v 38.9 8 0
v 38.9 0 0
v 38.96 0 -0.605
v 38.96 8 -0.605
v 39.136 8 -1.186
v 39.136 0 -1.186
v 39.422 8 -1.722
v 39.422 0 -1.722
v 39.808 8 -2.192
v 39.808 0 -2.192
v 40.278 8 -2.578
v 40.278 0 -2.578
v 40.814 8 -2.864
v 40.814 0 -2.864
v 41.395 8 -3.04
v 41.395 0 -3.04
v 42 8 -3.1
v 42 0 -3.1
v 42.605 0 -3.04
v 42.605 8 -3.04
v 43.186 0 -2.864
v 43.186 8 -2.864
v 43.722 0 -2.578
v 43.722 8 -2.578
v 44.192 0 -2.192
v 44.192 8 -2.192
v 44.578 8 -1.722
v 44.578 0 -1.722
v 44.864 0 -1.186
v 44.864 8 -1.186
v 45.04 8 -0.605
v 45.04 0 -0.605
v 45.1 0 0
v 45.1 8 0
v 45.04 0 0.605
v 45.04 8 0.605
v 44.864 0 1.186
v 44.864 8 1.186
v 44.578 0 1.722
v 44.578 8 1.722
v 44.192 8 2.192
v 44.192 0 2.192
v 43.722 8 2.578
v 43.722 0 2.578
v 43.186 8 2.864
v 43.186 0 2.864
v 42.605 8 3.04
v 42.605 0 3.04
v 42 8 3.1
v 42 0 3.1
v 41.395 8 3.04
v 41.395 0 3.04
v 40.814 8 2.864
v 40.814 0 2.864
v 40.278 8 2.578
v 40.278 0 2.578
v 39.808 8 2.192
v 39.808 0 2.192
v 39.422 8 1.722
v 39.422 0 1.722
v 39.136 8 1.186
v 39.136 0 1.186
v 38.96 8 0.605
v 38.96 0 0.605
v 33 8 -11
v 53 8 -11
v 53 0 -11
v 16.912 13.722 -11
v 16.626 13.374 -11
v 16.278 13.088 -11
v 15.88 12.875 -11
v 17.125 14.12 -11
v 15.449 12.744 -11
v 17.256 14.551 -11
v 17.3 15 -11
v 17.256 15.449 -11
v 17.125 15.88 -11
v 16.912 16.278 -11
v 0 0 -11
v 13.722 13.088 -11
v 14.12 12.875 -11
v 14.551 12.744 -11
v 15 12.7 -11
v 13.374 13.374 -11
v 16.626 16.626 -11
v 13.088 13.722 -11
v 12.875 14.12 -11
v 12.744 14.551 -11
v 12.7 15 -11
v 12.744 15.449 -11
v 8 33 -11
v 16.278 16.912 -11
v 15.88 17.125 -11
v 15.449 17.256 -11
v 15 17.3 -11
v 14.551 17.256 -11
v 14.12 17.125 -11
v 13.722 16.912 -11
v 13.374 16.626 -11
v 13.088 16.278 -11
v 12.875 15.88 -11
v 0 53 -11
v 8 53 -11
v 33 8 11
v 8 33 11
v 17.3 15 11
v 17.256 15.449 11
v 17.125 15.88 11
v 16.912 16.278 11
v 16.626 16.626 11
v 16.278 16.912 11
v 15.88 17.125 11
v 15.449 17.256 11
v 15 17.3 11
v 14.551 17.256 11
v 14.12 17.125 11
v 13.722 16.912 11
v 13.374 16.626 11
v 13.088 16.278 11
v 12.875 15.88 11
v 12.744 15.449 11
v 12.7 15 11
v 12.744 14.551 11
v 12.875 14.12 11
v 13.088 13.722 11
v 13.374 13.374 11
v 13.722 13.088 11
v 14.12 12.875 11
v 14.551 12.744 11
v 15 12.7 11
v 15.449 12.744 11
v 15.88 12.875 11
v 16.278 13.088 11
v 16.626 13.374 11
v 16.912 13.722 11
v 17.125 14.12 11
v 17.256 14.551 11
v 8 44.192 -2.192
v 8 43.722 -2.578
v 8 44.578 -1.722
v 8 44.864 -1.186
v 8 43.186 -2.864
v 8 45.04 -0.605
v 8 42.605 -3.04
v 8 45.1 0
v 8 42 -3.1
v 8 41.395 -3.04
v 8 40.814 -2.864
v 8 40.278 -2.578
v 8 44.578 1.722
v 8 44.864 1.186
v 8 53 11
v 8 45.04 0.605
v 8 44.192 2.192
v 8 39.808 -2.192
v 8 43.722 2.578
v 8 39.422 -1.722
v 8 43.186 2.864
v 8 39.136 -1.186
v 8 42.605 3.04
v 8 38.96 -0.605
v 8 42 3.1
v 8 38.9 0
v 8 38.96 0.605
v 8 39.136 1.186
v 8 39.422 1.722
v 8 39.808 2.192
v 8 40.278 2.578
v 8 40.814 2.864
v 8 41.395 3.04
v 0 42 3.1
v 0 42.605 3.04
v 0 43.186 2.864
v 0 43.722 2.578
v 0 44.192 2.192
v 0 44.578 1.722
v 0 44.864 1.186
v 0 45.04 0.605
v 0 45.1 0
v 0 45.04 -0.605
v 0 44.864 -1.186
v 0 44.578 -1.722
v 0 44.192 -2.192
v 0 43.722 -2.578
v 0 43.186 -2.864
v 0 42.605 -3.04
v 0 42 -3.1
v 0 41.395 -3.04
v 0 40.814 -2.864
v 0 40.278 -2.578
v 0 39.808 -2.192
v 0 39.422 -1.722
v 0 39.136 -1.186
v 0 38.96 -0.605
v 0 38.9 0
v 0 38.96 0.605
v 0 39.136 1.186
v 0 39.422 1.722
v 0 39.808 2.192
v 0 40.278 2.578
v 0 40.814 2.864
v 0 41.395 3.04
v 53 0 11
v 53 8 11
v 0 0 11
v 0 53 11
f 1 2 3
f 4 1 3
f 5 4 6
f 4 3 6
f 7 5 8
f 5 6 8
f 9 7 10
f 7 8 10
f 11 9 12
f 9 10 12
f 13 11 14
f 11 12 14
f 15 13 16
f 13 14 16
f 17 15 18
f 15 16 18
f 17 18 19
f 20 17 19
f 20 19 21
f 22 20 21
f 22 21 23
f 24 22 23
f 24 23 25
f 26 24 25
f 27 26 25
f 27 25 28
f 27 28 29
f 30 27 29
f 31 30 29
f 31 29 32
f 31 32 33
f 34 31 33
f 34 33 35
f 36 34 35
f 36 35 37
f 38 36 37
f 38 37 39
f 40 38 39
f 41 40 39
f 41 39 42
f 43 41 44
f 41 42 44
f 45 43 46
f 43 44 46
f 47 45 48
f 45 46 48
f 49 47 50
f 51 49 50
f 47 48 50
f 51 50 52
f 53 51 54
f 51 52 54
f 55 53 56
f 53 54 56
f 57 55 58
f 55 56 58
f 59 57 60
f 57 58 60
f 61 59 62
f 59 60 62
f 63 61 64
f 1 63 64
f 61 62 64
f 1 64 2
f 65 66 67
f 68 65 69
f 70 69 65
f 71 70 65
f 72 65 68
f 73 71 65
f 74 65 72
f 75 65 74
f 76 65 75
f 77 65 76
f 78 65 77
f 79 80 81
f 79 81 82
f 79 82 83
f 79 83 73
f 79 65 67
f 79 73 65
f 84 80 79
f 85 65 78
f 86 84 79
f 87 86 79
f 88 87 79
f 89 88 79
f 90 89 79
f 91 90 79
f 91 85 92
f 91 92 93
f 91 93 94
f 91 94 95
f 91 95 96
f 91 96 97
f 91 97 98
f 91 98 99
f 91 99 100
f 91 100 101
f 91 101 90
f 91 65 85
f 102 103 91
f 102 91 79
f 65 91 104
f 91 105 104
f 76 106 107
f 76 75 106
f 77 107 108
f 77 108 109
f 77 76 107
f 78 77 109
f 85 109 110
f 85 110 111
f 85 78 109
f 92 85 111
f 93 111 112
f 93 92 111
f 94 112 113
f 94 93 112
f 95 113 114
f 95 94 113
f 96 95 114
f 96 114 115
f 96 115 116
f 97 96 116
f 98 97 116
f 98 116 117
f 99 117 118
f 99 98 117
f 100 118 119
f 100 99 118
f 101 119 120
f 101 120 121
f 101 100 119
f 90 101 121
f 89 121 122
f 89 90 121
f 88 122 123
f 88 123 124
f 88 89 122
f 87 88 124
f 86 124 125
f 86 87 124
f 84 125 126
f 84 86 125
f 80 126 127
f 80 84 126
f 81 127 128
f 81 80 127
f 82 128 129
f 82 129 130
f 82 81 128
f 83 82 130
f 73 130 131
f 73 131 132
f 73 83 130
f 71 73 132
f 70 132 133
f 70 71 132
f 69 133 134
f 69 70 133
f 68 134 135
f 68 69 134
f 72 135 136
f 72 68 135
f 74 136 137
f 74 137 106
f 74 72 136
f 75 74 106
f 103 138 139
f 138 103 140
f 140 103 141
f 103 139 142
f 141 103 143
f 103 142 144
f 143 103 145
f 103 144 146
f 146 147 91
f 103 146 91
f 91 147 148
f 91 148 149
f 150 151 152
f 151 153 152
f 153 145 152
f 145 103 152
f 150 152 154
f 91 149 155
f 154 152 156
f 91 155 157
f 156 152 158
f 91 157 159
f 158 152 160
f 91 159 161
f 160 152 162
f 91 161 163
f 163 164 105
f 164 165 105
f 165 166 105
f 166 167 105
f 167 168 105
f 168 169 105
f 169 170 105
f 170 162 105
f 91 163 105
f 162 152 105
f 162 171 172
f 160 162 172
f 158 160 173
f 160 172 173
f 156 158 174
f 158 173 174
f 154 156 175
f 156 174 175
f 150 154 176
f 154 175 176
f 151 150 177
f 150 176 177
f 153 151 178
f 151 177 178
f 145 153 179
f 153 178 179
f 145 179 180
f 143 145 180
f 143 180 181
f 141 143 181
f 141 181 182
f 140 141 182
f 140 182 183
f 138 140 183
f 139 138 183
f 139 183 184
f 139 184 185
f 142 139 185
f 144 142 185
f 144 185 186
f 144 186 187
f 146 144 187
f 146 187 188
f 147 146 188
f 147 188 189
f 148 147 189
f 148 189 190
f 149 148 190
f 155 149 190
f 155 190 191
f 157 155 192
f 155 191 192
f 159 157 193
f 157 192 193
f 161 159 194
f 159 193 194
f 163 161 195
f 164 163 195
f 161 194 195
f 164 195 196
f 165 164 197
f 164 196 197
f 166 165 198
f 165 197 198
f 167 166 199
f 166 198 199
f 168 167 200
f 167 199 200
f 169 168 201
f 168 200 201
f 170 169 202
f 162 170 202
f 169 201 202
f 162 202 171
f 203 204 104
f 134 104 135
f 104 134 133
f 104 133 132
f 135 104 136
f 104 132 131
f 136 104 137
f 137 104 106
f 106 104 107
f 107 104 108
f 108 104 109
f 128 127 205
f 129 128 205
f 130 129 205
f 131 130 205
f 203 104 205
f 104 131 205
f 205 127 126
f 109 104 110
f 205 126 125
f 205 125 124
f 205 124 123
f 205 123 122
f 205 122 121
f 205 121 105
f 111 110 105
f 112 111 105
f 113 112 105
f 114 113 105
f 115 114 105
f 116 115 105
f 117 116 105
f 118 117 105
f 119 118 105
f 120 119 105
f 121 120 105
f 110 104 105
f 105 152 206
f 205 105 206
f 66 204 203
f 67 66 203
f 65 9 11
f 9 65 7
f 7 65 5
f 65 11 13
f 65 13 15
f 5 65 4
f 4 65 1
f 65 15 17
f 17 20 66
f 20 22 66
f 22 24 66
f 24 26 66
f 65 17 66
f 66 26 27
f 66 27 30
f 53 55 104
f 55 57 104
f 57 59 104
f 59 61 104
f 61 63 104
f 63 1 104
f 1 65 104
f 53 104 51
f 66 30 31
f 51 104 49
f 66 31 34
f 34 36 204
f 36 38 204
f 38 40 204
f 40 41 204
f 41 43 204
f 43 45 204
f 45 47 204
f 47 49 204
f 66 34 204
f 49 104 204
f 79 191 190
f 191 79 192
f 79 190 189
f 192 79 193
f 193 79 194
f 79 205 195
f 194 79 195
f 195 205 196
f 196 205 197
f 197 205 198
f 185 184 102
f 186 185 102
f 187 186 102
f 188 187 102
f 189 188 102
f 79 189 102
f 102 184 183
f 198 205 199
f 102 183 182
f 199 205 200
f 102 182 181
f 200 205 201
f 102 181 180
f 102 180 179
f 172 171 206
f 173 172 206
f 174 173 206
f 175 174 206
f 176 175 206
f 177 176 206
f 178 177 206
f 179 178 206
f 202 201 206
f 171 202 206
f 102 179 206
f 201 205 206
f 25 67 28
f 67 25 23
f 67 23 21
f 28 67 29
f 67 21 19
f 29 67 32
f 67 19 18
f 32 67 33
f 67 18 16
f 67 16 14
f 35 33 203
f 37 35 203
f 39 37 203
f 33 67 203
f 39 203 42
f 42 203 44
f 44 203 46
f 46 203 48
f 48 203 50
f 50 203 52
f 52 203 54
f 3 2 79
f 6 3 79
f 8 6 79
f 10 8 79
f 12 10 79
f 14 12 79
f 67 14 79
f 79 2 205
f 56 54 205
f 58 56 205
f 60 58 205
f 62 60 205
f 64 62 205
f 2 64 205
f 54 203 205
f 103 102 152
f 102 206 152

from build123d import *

# Parameters (mm, degrees)
SKETCH_1_R              = 2.3
EXTRUDE_1_DEPTH         = 11
HOLE_WIZARD_6_2_6_2_1_D = 6.2
HOLE_WIZARD_6_2_6_2_2_D = 6.2


with BuildPart() as part:
    # 草图1 → 凸台-拉伸1 (new, symmetric)
    with BuildSketch(Plane.XY):
        Polygon((0, 0), (0, 53), (8, 53), (8, 33), (33, 8), (53, 8), (53, 0), align=None)
        with Locations((15, 15)):
            Circle(SKETCH_1_R, mode=Mode.SUBTRACT)
    extrude(amount=EXTRUDE_1_DEPTH, both=True)

    # Ø6.2 (6.2) 直径孔1 (through all)
    with Locations(Plane(origin=(0, 8, 0), x_dir=(1, 0, 0), z_dir=(0, 1, 0))):
        with Locations((42, 0)):
            Hole(HOLE_WIZARD_6_2_6_2_1_D / 2)

    # Ø6.2 (6.2) 直径孔2 (through all)
    with Locations(Plane(origin=(8, 0, 0), x_dir=(0, 0, -1), z_dir=(1, 0, 0))):
        with Locations((0, 42)):
            Hole(HOLE_WIZARD_6_2_6_2_2_D / 2)


solid = part.part
